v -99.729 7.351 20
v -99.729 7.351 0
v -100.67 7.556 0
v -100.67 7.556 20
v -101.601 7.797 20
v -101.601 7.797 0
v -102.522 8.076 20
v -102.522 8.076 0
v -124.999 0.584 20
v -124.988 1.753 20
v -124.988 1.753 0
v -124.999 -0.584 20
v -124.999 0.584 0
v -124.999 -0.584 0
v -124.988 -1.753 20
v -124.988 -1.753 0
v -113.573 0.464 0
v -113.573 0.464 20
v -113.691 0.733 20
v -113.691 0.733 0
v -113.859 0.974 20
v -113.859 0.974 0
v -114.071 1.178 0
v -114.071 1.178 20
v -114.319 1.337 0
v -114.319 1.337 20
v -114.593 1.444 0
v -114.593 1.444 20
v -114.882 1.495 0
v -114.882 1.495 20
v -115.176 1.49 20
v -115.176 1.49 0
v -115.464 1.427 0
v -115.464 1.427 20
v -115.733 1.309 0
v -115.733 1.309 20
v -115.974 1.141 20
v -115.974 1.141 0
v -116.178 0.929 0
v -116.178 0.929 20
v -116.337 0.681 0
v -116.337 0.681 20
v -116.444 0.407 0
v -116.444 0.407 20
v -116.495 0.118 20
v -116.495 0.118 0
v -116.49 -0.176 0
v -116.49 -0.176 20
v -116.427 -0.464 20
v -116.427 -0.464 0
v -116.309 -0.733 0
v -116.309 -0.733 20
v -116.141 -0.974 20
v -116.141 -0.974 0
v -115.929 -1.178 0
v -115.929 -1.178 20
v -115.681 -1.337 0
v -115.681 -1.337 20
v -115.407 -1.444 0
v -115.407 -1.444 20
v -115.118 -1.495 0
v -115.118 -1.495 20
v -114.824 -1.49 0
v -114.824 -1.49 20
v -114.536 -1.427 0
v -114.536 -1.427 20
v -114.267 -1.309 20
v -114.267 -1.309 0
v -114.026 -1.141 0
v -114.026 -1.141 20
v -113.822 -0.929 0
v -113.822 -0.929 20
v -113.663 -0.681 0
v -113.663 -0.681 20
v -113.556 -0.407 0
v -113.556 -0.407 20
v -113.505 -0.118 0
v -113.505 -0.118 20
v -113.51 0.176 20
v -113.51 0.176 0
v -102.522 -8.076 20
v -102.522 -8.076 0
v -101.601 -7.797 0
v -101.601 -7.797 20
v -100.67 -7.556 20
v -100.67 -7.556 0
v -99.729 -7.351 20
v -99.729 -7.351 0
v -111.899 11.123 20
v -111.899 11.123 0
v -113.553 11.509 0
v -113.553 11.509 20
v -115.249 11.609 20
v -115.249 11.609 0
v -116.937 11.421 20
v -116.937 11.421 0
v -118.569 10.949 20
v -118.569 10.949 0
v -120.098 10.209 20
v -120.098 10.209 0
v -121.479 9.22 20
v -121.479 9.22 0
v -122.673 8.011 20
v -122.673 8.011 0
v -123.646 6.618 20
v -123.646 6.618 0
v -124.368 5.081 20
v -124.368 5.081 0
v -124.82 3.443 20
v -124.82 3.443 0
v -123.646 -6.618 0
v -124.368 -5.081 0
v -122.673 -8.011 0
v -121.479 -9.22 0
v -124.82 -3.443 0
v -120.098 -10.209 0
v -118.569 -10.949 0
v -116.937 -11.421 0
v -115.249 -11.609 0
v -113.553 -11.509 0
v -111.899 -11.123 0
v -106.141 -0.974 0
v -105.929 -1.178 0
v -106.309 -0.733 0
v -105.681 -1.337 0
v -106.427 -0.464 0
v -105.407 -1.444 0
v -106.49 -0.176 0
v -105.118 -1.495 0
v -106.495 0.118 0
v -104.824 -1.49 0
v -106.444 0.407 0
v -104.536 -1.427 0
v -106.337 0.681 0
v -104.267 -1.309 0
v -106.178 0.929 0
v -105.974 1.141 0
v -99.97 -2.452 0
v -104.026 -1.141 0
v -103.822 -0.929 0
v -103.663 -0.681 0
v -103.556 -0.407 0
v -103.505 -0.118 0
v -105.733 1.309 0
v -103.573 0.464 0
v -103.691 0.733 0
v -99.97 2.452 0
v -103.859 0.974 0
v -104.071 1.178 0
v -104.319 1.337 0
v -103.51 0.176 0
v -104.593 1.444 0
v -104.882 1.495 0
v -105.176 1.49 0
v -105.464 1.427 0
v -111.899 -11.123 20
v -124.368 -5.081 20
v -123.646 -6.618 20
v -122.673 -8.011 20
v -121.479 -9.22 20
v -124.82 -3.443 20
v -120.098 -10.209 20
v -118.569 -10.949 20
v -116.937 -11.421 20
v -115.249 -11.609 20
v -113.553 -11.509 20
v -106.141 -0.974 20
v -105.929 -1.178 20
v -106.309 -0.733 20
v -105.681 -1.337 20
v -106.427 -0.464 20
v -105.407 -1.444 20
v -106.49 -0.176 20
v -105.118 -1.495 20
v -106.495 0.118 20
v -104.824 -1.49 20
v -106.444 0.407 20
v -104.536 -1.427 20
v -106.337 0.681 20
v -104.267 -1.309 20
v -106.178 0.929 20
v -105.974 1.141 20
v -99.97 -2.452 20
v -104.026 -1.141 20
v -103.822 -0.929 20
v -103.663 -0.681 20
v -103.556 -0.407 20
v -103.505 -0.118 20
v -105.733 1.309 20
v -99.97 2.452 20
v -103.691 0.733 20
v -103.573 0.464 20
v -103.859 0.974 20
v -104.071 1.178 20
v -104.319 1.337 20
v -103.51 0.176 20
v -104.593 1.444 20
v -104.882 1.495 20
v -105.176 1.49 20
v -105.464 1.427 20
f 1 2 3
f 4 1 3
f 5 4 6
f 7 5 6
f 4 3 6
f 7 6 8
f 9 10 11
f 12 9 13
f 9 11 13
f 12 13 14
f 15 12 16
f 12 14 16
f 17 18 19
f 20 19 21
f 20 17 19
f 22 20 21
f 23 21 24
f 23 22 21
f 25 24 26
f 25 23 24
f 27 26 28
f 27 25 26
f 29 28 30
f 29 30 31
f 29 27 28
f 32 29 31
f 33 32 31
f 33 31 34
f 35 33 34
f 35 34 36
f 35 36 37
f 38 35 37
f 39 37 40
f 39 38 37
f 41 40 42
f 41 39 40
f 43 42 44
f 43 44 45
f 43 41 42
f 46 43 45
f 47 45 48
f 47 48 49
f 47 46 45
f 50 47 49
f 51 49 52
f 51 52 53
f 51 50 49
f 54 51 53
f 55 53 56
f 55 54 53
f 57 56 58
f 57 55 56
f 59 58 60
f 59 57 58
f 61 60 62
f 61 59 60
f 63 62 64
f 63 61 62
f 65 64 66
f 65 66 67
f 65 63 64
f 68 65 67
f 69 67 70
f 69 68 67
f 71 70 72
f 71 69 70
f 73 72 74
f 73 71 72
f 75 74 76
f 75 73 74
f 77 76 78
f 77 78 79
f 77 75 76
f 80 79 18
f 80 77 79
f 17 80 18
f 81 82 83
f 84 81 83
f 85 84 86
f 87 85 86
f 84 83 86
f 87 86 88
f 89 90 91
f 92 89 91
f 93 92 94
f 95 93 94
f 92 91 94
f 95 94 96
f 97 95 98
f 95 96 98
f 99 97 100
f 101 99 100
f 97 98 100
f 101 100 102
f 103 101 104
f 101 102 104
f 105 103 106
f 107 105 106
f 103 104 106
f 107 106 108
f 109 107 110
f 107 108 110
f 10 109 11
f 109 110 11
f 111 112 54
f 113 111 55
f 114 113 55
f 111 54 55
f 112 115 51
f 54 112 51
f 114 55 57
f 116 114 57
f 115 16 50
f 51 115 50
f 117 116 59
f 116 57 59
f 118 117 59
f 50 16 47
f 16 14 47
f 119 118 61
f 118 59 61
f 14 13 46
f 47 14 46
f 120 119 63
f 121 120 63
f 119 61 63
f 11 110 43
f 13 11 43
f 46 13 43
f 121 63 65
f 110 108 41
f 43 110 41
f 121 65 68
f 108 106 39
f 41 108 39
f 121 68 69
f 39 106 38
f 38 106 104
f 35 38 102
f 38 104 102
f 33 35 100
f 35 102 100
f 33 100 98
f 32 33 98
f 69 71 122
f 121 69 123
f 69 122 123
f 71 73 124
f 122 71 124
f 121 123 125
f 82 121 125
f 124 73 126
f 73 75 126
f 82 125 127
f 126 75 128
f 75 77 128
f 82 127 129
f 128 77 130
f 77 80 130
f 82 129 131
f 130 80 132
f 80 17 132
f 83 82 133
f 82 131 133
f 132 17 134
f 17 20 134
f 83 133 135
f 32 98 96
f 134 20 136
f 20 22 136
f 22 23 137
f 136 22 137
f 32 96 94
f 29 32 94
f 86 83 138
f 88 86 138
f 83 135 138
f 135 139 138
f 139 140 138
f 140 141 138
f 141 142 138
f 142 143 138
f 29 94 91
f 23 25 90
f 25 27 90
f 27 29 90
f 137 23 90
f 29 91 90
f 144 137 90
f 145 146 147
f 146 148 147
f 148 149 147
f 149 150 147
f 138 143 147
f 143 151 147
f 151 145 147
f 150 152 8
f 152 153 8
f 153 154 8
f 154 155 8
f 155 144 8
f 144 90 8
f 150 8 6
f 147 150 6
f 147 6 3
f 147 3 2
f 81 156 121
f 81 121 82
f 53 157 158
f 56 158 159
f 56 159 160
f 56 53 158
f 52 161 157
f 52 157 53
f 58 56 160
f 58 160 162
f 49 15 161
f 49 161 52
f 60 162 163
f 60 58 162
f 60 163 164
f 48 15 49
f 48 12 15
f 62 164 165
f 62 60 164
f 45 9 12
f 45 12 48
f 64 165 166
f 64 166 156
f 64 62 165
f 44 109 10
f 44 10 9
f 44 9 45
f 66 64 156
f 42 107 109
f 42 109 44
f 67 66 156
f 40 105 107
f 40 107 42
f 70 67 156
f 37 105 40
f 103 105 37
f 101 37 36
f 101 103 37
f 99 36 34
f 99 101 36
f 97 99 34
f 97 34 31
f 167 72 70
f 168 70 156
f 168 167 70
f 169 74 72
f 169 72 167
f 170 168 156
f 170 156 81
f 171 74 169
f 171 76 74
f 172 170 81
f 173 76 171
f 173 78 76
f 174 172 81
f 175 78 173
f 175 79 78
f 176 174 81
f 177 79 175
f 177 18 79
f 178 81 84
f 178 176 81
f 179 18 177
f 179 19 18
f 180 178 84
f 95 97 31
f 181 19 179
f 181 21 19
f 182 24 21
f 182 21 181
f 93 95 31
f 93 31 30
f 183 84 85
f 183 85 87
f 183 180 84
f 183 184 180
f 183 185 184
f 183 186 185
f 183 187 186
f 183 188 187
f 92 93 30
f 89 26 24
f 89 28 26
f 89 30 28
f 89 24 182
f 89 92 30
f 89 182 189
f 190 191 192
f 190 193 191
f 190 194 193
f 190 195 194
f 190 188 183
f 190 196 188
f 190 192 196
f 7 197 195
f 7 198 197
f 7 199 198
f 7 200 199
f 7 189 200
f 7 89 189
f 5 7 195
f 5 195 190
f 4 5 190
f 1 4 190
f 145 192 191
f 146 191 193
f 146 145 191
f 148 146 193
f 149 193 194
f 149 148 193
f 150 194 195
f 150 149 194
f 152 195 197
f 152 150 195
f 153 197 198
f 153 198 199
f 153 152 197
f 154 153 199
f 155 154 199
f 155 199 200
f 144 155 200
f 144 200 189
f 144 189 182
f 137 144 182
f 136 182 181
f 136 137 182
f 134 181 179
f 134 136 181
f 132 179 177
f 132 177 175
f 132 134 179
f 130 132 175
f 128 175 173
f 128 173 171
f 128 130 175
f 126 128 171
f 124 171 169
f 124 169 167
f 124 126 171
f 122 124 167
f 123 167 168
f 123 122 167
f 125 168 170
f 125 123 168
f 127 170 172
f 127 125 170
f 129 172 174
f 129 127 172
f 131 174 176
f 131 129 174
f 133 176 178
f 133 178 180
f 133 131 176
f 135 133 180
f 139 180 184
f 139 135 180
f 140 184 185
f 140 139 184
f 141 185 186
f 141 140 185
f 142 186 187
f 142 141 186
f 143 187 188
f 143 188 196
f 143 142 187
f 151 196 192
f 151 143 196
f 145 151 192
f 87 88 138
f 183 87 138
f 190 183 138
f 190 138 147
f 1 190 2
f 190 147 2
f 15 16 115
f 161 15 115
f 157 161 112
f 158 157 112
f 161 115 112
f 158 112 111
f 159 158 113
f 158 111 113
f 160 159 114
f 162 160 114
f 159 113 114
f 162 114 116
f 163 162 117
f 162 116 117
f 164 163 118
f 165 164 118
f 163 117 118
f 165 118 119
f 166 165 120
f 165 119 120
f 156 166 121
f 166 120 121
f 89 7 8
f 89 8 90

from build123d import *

# Parameters (mm, degrees)
EXTRUDE_1_DEPTH = 20


with BuildPart() as part:
    # 草图1 → 凸台-拉伸1 (new body)
    with BuildSketch(Plane.XY):
        with BuildLine():
            Line((-102.522059495, 8.076343046), (-111.898526204, 11.122941761))
            ThreePointArc((-111.898526204, 11.122941761), (-120.809688049, 9.743554451), (-124.987713204, 1.752583259))
            ThreePointArc((-124.987713204, 1.752583259), (-125, 0), (-124.987713204, -1.752583259))
            ThreePointArc((-124.987713204, -1.752583259), (-120.809688049, -9.743554451), (-111.898526204, -11.122941761))
            Line((-111.898526204, -11.122941761), (-102.522059495, -8.076343046))
            ThreePointArc((-102.522059495, -8.076343046), (-101.136647244, -7.671824451), (-99.729424961, -7.3513126))
            ThreePointArc((-99.729424961, -7.3513126), (-100, 0), (-99.729424961, 7.3513126))
            ThreePointArc((-99.729424961, 7.3513126), (-101.136647244, 7.671824451), (-102.522059495, 8.076343046))
        make_face()
        with BuildLine():
            ThreePointArc((-106.426584774, -0.463525492), (-104.536474508, -1.426584774), (-103.573415226, 0.463525492))
            ThreePointArc((-103.573415226, 0.463525492), (-105.463525492, 1.426584774), (-106.426584774, -0.463525492))
        make_face(mode=Mode.SUBTRACT)
        with BuildLine():
            ThreePointArc((-116.426584774, -0.463525492), (-114.536474508, -1.426584774), (-113.573415226, 0.463525492))
            ThreePointArc((-113.573415226, 0.463525492), (-115.463525492, 1.426584774), (-116.426584774, -0.463525492))
        make_face(mode=Mode.SUBTRACT)
    extrude(amount=EXTRUDE_1_DEPTH)


solid = part.part
